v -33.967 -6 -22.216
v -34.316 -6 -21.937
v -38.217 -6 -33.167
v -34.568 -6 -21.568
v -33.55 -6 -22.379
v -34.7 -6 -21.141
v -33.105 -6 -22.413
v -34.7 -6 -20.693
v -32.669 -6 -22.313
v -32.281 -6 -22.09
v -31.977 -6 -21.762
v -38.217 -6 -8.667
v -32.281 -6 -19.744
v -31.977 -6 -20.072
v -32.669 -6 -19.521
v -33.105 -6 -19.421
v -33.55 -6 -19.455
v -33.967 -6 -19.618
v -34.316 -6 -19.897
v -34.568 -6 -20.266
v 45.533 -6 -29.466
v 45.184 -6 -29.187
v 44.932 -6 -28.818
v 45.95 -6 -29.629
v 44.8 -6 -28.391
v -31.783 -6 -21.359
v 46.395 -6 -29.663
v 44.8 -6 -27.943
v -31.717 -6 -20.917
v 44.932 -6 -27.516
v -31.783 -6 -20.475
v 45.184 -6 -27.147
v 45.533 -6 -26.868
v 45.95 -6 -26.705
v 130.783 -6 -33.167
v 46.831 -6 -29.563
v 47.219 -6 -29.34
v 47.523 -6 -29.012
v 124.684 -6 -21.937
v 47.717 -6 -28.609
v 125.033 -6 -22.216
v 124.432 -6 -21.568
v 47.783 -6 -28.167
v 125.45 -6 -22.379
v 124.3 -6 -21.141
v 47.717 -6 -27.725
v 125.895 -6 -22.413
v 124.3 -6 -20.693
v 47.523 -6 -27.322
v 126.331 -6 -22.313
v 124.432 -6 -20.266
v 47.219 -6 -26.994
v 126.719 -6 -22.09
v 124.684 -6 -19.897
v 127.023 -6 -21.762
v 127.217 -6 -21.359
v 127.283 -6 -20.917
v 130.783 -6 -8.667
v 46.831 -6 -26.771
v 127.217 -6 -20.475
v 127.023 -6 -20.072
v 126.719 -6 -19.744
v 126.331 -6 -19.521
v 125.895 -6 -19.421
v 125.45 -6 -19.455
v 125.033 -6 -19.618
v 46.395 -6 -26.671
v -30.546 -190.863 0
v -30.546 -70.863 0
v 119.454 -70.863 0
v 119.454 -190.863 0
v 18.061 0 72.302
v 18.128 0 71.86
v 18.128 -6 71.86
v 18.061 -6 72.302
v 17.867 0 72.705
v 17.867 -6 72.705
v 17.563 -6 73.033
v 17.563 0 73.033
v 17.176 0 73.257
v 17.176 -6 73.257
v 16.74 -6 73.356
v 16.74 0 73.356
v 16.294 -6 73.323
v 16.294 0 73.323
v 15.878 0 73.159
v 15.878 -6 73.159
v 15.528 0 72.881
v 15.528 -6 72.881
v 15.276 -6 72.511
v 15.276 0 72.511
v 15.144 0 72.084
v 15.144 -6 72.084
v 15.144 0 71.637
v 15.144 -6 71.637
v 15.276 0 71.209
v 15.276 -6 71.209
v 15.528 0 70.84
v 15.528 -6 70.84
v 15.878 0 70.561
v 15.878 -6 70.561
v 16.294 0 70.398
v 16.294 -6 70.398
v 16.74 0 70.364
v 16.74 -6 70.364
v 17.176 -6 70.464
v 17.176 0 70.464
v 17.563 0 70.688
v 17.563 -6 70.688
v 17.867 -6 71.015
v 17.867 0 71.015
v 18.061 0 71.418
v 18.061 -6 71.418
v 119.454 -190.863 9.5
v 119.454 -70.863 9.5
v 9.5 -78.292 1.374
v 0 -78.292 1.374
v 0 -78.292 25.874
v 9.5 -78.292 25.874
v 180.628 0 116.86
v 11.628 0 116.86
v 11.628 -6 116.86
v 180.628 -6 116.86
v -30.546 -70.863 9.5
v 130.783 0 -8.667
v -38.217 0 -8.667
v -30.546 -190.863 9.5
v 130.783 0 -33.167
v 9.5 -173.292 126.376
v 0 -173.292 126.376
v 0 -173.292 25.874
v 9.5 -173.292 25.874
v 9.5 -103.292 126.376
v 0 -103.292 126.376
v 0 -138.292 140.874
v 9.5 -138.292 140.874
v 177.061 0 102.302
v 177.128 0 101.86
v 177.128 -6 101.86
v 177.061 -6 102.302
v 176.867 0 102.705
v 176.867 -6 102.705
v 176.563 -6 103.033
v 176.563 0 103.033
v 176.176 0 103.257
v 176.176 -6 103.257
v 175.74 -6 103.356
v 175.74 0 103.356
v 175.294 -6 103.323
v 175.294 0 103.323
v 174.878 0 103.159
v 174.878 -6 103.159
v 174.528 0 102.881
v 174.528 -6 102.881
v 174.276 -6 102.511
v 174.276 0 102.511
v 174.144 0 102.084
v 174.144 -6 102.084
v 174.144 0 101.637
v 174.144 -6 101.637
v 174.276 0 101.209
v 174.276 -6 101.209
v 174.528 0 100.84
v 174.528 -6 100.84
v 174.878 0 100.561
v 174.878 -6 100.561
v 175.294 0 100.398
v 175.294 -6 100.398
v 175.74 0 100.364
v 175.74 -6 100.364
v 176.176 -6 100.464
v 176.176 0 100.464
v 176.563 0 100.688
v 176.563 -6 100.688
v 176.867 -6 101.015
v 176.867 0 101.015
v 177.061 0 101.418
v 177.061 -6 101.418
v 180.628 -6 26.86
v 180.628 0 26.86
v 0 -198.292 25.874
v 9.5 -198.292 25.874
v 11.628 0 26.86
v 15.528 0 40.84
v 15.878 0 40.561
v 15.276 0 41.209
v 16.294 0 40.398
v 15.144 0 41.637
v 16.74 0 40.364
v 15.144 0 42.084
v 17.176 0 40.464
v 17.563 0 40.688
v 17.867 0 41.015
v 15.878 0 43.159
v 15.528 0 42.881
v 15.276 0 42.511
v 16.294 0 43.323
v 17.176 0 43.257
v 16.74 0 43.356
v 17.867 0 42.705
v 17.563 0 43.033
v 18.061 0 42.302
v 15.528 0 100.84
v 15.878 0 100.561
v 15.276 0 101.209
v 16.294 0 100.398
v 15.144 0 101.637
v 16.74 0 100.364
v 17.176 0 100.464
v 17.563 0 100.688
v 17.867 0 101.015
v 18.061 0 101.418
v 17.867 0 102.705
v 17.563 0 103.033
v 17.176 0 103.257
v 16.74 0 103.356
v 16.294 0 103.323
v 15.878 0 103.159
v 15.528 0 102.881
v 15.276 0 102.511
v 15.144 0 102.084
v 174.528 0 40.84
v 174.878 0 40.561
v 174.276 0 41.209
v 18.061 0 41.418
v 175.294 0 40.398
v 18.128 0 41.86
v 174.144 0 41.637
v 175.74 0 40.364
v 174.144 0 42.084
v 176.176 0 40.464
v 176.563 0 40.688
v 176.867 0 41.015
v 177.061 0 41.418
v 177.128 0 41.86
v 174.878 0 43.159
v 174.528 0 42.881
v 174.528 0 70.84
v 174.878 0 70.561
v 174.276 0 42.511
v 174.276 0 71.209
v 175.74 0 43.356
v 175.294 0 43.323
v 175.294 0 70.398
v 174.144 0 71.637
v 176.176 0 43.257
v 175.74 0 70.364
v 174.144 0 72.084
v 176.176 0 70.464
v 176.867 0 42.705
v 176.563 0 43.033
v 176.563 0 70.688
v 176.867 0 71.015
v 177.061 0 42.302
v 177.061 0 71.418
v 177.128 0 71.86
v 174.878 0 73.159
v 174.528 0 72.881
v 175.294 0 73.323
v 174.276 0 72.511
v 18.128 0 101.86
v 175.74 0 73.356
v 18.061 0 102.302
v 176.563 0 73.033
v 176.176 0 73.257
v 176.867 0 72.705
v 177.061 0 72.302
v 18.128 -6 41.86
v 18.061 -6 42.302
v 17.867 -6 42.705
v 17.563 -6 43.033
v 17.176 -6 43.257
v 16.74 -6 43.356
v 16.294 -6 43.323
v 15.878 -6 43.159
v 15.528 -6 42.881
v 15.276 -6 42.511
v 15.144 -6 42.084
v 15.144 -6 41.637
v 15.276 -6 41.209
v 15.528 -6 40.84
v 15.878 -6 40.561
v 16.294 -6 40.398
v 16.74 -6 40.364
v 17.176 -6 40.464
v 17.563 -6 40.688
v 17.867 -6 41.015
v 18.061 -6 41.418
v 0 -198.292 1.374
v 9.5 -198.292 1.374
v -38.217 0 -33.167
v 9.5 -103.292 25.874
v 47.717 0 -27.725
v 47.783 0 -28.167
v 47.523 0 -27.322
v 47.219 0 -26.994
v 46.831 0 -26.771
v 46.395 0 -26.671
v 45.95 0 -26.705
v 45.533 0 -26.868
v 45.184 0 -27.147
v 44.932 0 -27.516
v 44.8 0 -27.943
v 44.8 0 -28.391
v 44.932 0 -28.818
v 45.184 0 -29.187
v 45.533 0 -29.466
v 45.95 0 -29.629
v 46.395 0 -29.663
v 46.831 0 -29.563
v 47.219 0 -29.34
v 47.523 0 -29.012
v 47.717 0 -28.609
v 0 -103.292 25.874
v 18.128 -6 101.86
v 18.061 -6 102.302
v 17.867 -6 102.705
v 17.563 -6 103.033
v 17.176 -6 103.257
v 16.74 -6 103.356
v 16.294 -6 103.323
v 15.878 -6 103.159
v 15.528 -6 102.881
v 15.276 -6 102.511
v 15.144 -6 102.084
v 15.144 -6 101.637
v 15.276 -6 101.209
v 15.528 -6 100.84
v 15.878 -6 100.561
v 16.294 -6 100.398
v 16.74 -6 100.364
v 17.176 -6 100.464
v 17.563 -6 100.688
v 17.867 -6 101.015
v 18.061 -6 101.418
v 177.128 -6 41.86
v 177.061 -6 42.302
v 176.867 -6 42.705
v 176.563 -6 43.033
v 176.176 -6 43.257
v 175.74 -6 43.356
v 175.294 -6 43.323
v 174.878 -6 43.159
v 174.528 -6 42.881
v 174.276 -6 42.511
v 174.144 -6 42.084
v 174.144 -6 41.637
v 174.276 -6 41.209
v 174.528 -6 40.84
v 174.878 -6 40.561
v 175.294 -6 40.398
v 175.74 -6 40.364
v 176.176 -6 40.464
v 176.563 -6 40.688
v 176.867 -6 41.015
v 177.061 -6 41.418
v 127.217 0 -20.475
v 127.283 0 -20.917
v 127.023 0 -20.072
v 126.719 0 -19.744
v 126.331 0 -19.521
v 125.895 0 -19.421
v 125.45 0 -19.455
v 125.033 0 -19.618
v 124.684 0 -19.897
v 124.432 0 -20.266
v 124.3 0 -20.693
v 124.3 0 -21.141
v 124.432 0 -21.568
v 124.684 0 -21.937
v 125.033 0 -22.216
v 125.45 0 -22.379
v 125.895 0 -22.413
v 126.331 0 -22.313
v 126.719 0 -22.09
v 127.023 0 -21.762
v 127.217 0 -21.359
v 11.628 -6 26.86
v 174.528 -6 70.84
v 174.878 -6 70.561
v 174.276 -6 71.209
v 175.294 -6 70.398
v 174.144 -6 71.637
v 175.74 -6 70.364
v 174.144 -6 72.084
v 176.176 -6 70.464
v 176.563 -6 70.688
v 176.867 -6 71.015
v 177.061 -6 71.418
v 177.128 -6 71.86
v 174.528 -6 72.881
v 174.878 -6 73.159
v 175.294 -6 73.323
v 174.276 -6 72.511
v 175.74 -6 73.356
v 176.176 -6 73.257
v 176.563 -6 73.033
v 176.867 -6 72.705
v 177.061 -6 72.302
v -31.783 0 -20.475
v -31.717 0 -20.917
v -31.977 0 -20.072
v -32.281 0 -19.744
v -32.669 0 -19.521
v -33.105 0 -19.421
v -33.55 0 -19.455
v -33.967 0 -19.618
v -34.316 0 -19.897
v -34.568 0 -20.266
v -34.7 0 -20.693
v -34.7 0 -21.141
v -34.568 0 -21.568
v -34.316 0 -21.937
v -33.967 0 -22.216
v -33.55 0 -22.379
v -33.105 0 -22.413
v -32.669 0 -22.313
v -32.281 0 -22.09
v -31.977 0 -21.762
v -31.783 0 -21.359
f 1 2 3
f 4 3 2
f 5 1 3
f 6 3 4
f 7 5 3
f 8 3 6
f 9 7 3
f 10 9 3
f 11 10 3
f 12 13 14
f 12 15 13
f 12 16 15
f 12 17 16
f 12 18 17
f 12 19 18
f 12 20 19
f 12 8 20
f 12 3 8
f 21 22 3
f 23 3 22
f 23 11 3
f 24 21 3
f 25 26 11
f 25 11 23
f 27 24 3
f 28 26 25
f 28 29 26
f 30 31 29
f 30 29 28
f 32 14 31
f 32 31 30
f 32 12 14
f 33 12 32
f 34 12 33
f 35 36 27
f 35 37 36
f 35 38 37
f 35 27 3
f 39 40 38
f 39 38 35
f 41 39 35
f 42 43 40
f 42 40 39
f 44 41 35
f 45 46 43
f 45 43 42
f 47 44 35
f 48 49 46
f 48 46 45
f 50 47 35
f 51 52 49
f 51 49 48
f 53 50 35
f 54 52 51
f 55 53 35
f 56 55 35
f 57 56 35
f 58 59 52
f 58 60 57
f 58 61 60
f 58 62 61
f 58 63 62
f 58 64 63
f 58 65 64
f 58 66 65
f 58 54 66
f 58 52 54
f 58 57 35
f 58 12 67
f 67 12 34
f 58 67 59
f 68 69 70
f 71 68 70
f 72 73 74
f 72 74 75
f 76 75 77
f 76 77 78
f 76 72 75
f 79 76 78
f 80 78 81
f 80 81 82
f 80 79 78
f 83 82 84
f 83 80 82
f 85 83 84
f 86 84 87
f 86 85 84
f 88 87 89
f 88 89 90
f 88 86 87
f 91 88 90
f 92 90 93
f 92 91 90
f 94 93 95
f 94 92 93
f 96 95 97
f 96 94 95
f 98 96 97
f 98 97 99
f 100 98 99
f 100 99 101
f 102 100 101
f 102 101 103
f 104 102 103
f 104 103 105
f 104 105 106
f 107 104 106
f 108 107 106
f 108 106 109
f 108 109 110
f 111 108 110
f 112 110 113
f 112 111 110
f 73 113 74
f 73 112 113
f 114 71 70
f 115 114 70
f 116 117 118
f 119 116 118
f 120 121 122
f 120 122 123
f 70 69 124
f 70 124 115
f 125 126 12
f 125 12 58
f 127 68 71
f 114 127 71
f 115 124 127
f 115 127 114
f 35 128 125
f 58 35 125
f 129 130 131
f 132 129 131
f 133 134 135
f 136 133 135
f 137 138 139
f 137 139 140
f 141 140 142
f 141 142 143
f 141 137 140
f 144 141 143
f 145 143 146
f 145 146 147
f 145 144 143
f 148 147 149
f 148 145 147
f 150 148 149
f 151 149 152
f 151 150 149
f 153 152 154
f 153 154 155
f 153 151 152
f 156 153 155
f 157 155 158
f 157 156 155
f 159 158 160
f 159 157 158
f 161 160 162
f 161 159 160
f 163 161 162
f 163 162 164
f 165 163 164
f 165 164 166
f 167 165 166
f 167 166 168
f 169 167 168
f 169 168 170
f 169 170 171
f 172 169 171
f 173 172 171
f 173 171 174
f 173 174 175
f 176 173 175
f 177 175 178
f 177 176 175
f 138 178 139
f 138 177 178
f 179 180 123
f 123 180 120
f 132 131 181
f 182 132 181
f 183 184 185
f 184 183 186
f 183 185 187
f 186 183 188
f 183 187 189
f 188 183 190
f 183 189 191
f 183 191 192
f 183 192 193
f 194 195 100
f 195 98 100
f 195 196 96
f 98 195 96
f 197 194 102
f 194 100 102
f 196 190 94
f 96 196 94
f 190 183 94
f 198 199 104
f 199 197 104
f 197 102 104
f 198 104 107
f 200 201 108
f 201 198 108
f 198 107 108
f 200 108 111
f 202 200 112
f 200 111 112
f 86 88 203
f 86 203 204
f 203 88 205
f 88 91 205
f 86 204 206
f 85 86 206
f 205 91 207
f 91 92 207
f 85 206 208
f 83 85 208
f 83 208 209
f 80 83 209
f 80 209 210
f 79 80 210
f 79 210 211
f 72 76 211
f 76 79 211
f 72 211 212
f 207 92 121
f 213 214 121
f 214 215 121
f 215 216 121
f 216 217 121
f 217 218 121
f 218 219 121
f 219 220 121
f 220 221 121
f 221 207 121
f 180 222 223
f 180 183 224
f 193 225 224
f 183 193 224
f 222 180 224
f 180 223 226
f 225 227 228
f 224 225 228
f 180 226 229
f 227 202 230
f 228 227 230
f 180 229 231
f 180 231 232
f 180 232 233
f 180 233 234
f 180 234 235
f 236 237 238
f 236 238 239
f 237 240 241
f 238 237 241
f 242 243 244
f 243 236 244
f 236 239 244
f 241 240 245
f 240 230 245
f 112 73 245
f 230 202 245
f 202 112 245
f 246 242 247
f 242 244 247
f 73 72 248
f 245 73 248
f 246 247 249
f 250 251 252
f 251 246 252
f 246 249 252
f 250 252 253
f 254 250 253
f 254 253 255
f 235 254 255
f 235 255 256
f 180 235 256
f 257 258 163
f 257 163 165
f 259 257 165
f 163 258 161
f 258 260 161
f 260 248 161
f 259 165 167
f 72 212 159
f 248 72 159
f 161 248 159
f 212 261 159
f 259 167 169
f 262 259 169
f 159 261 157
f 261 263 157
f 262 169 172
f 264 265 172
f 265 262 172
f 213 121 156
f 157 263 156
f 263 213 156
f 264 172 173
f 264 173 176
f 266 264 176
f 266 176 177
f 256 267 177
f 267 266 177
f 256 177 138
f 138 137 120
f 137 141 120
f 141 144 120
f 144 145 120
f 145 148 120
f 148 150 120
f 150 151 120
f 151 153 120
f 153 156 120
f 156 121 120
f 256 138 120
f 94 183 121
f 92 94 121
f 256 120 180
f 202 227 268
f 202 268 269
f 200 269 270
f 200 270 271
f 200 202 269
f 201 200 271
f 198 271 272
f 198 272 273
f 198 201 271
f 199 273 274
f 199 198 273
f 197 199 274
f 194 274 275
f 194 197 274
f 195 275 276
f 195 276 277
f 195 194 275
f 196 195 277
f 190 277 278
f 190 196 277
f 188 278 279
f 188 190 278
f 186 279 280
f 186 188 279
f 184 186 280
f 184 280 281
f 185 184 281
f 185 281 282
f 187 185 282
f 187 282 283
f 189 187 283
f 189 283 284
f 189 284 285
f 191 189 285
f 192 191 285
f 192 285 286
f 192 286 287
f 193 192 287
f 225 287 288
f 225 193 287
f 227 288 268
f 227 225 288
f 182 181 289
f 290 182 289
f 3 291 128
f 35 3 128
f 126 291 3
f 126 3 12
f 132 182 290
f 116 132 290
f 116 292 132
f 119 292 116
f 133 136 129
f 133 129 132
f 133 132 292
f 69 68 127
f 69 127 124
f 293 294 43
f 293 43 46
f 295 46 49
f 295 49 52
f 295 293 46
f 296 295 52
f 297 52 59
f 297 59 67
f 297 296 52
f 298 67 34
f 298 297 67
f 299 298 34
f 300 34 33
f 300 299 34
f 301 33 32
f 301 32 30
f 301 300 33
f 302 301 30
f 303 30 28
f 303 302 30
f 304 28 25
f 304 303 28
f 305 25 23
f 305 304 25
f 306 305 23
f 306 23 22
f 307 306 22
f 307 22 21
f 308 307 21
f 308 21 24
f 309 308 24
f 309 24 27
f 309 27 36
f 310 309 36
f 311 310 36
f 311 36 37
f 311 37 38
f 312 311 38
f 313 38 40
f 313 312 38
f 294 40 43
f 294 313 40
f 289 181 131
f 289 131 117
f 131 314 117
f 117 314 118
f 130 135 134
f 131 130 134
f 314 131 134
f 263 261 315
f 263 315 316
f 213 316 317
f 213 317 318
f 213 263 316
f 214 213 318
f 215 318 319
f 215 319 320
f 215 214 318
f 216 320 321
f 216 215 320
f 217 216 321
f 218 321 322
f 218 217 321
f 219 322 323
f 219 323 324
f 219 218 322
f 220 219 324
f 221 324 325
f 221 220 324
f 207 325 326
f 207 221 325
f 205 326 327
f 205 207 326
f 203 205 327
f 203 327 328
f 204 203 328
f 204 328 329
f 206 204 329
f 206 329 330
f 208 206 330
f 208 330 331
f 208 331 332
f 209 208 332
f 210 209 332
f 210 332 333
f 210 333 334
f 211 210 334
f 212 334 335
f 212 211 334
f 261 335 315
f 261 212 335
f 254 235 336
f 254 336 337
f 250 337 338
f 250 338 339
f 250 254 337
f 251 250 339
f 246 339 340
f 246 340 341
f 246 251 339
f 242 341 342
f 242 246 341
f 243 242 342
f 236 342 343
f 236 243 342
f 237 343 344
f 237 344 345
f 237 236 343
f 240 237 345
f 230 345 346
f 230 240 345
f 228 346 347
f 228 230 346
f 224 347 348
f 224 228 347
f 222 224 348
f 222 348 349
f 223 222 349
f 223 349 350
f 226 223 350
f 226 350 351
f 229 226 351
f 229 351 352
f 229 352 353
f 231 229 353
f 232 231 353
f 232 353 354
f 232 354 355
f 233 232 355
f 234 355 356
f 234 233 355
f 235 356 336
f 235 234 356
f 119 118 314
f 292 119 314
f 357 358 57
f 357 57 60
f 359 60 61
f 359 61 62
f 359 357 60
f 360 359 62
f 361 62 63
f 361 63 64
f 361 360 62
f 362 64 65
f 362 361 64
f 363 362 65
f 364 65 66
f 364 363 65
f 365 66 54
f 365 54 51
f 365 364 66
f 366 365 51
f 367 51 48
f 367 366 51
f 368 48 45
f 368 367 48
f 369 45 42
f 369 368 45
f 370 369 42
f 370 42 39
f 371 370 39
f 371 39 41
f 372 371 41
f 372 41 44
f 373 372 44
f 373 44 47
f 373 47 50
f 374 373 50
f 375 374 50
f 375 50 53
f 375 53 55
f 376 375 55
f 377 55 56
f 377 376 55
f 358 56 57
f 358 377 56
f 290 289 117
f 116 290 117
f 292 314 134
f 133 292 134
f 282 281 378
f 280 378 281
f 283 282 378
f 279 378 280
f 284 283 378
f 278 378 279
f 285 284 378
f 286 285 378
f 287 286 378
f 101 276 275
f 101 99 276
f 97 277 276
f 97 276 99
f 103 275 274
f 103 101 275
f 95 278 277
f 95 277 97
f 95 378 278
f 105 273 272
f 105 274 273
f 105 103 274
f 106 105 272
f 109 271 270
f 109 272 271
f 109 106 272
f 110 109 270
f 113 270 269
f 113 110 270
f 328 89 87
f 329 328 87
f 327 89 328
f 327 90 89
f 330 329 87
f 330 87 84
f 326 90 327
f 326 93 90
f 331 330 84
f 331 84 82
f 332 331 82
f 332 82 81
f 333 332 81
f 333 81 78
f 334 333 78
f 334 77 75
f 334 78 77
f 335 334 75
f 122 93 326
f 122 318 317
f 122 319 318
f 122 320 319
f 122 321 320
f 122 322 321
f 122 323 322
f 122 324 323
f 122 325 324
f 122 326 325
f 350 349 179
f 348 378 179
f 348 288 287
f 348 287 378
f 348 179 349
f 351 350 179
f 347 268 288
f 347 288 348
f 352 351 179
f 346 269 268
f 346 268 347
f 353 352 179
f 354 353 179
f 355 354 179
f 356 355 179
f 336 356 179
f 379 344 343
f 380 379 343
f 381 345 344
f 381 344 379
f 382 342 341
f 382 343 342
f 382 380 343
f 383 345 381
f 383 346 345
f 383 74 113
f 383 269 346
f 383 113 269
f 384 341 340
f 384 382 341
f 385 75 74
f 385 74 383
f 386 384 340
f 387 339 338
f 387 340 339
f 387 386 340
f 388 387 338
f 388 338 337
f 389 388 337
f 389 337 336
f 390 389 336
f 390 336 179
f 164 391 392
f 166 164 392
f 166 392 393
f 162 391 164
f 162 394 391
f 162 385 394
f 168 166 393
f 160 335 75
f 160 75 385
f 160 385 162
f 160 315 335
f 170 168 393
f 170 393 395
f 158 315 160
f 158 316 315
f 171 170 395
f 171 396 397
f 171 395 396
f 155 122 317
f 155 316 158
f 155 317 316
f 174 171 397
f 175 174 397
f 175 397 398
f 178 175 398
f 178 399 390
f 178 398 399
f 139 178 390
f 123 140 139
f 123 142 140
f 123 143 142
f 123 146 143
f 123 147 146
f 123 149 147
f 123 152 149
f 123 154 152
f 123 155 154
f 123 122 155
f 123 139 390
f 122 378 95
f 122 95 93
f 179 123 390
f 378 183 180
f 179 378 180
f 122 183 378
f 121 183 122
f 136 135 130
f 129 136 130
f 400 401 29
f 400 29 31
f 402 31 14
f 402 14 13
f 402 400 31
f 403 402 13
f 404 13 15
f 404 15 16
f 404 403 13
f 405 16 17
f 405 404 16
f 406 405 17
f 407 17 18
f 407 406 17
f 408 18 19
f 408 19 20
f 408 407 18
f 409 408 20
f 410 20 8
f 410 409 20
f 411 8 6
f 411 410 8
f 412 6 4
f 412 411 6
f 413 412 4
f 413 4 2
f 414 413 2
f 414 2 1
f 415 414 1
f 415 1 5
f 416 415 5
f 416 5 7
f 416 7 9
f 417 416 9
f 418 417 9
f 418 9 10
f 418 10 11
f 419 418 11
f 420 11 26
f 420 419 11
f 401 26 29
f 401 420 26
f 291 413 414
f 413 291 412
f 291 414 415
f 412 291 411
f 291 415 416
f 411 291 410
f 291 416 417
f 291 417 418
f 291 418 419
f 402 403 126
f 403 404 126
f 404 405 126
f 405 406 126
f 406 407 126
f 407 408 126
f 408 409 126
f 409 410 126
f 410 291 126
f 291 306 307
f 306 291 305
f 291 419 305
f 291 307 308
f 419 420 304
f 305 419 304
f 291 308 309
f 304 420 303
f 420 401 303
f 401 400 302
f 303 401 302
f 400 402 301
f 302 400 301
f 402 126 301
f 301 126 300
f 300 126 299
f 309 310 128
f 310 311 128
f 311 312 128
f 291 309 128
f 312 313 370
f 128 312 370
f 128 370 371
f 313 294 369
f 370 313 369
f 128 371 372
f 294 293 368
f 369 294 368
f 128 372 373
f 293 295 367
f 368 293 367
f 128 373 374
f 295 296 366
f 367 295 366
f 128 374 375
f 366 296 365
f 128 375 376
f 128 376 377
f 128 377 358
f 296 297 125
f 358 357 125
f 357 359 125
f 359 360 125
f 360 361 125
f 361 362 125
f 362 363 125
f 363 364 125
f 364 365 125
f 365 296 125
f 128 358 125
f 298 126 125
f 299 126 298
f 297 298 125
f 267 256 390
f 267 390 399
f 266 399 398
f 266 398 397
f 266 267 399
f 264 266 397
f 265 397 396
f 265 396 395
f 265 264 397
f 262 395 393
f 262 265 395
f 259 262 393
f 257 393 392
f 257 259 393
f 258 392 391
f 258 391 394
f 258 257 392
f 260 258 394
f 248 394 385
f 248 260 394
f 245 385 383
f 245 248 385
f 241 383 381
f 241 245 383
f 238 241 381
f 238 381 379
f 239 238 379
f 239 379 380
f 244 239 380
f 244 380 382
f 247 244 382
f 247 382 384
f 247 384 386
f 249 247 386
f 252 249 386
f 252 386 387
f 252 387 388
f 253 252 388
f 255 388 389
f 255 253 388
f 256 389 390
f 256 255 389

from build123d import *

# Parameters (mm, degrees)
F0_W     = 150
F0_H     = 120
F1_DEPTH = 9.5
F3_DEPTH = 9.5
F4_W     = 169
F4_H     = 90
F4_R     = 1.5
F5_DEPTH = 6
F6_W     = 169
F6_H     = 24.5
F6_R     = 1.5
F7_DEPTH = 6


with BuildPart() as f1:
    # F0 (on Top) → F1 (new body)
    with BuildSketch(Plane.XY):
        with Locations((44.454391, -130.862983)):
            Rectangle(F0_W, F0_H)
    extrude(amount=F1_DEPTH)


with BuildPart() as f3:
    # F2 (on Right) → F3 (new body)
    with BuildSketch(Plane.YZ):
        Polygon((-173.291832, 1.373903), (-103.291832, 1.373903), (-78.291832, 1.373903), (-78.291832, 25.873903), (-103.291832, 25.873903), (-103.291832, 126.376428), (-138.291832, 140.873903), (-173.291832, 126.376428), (-173.291832, 25.873903), (-198.291832, 25.873903), (-198.291832, 1.373903), align=None)
    extrude(amount=F3_DEPTH)


with BuildPart() as f5:
    # F4 (on Front) → F5 (new body)
    with BuildSketch(Plane.XZ):
        with Locations((96.127525, 71.860274)):
            Rectangle(F4_W, F4_H)
        with Locations((16.627525, 41.860274)):
            Circle(F4_R, mode=Mode.SUBTRACT)
        with Locations((175.627525, 41.860274)):
            Circle(F4_R, mode=Mode.SUBTRACT)
        with Locations((16.627525, 71.860274)):
            Circle(F4_R, mode=Mode.SUBTRACT)
        with Locations((16.627525, 101.860274)):
            Circle(F4_R, mode=Mode.SUBTRACT)
        with Locations((175.627525, 71.860274)):
            Circle(F4_R, mode=Mode.SUBTRACT)
        with Locations((175.627525, 101.860274)):
            Circle(F4_R, mode=Mode.SUBTRACT)
    extrude(amount=F5_DEPTH)


with BuildPart() as f7:
    # F6 (on Front) → F7 (new body)
    with BuildSketch(Plane.XZ):
        with Locations((46.283312, -20.916975)):
            Rectangle(F6_W, F6_H)
        with Locations((-33.216688, -20.916975)):
            Circle(F6_R, mode=Mode.SUBTRACT)
        with Locations((46.283312, -28.166975)):
            Circle(F6_R, mode=Mode.SUBTRACT)
        with Locations((125.783312, -20.916975)):
            Circle(F6_R, mode=Mode.SUBTRACT)
    extrude(amount=F7_DEPTH)


solid = Compound([f1.part, f3.part, f5.part, f7.part])
